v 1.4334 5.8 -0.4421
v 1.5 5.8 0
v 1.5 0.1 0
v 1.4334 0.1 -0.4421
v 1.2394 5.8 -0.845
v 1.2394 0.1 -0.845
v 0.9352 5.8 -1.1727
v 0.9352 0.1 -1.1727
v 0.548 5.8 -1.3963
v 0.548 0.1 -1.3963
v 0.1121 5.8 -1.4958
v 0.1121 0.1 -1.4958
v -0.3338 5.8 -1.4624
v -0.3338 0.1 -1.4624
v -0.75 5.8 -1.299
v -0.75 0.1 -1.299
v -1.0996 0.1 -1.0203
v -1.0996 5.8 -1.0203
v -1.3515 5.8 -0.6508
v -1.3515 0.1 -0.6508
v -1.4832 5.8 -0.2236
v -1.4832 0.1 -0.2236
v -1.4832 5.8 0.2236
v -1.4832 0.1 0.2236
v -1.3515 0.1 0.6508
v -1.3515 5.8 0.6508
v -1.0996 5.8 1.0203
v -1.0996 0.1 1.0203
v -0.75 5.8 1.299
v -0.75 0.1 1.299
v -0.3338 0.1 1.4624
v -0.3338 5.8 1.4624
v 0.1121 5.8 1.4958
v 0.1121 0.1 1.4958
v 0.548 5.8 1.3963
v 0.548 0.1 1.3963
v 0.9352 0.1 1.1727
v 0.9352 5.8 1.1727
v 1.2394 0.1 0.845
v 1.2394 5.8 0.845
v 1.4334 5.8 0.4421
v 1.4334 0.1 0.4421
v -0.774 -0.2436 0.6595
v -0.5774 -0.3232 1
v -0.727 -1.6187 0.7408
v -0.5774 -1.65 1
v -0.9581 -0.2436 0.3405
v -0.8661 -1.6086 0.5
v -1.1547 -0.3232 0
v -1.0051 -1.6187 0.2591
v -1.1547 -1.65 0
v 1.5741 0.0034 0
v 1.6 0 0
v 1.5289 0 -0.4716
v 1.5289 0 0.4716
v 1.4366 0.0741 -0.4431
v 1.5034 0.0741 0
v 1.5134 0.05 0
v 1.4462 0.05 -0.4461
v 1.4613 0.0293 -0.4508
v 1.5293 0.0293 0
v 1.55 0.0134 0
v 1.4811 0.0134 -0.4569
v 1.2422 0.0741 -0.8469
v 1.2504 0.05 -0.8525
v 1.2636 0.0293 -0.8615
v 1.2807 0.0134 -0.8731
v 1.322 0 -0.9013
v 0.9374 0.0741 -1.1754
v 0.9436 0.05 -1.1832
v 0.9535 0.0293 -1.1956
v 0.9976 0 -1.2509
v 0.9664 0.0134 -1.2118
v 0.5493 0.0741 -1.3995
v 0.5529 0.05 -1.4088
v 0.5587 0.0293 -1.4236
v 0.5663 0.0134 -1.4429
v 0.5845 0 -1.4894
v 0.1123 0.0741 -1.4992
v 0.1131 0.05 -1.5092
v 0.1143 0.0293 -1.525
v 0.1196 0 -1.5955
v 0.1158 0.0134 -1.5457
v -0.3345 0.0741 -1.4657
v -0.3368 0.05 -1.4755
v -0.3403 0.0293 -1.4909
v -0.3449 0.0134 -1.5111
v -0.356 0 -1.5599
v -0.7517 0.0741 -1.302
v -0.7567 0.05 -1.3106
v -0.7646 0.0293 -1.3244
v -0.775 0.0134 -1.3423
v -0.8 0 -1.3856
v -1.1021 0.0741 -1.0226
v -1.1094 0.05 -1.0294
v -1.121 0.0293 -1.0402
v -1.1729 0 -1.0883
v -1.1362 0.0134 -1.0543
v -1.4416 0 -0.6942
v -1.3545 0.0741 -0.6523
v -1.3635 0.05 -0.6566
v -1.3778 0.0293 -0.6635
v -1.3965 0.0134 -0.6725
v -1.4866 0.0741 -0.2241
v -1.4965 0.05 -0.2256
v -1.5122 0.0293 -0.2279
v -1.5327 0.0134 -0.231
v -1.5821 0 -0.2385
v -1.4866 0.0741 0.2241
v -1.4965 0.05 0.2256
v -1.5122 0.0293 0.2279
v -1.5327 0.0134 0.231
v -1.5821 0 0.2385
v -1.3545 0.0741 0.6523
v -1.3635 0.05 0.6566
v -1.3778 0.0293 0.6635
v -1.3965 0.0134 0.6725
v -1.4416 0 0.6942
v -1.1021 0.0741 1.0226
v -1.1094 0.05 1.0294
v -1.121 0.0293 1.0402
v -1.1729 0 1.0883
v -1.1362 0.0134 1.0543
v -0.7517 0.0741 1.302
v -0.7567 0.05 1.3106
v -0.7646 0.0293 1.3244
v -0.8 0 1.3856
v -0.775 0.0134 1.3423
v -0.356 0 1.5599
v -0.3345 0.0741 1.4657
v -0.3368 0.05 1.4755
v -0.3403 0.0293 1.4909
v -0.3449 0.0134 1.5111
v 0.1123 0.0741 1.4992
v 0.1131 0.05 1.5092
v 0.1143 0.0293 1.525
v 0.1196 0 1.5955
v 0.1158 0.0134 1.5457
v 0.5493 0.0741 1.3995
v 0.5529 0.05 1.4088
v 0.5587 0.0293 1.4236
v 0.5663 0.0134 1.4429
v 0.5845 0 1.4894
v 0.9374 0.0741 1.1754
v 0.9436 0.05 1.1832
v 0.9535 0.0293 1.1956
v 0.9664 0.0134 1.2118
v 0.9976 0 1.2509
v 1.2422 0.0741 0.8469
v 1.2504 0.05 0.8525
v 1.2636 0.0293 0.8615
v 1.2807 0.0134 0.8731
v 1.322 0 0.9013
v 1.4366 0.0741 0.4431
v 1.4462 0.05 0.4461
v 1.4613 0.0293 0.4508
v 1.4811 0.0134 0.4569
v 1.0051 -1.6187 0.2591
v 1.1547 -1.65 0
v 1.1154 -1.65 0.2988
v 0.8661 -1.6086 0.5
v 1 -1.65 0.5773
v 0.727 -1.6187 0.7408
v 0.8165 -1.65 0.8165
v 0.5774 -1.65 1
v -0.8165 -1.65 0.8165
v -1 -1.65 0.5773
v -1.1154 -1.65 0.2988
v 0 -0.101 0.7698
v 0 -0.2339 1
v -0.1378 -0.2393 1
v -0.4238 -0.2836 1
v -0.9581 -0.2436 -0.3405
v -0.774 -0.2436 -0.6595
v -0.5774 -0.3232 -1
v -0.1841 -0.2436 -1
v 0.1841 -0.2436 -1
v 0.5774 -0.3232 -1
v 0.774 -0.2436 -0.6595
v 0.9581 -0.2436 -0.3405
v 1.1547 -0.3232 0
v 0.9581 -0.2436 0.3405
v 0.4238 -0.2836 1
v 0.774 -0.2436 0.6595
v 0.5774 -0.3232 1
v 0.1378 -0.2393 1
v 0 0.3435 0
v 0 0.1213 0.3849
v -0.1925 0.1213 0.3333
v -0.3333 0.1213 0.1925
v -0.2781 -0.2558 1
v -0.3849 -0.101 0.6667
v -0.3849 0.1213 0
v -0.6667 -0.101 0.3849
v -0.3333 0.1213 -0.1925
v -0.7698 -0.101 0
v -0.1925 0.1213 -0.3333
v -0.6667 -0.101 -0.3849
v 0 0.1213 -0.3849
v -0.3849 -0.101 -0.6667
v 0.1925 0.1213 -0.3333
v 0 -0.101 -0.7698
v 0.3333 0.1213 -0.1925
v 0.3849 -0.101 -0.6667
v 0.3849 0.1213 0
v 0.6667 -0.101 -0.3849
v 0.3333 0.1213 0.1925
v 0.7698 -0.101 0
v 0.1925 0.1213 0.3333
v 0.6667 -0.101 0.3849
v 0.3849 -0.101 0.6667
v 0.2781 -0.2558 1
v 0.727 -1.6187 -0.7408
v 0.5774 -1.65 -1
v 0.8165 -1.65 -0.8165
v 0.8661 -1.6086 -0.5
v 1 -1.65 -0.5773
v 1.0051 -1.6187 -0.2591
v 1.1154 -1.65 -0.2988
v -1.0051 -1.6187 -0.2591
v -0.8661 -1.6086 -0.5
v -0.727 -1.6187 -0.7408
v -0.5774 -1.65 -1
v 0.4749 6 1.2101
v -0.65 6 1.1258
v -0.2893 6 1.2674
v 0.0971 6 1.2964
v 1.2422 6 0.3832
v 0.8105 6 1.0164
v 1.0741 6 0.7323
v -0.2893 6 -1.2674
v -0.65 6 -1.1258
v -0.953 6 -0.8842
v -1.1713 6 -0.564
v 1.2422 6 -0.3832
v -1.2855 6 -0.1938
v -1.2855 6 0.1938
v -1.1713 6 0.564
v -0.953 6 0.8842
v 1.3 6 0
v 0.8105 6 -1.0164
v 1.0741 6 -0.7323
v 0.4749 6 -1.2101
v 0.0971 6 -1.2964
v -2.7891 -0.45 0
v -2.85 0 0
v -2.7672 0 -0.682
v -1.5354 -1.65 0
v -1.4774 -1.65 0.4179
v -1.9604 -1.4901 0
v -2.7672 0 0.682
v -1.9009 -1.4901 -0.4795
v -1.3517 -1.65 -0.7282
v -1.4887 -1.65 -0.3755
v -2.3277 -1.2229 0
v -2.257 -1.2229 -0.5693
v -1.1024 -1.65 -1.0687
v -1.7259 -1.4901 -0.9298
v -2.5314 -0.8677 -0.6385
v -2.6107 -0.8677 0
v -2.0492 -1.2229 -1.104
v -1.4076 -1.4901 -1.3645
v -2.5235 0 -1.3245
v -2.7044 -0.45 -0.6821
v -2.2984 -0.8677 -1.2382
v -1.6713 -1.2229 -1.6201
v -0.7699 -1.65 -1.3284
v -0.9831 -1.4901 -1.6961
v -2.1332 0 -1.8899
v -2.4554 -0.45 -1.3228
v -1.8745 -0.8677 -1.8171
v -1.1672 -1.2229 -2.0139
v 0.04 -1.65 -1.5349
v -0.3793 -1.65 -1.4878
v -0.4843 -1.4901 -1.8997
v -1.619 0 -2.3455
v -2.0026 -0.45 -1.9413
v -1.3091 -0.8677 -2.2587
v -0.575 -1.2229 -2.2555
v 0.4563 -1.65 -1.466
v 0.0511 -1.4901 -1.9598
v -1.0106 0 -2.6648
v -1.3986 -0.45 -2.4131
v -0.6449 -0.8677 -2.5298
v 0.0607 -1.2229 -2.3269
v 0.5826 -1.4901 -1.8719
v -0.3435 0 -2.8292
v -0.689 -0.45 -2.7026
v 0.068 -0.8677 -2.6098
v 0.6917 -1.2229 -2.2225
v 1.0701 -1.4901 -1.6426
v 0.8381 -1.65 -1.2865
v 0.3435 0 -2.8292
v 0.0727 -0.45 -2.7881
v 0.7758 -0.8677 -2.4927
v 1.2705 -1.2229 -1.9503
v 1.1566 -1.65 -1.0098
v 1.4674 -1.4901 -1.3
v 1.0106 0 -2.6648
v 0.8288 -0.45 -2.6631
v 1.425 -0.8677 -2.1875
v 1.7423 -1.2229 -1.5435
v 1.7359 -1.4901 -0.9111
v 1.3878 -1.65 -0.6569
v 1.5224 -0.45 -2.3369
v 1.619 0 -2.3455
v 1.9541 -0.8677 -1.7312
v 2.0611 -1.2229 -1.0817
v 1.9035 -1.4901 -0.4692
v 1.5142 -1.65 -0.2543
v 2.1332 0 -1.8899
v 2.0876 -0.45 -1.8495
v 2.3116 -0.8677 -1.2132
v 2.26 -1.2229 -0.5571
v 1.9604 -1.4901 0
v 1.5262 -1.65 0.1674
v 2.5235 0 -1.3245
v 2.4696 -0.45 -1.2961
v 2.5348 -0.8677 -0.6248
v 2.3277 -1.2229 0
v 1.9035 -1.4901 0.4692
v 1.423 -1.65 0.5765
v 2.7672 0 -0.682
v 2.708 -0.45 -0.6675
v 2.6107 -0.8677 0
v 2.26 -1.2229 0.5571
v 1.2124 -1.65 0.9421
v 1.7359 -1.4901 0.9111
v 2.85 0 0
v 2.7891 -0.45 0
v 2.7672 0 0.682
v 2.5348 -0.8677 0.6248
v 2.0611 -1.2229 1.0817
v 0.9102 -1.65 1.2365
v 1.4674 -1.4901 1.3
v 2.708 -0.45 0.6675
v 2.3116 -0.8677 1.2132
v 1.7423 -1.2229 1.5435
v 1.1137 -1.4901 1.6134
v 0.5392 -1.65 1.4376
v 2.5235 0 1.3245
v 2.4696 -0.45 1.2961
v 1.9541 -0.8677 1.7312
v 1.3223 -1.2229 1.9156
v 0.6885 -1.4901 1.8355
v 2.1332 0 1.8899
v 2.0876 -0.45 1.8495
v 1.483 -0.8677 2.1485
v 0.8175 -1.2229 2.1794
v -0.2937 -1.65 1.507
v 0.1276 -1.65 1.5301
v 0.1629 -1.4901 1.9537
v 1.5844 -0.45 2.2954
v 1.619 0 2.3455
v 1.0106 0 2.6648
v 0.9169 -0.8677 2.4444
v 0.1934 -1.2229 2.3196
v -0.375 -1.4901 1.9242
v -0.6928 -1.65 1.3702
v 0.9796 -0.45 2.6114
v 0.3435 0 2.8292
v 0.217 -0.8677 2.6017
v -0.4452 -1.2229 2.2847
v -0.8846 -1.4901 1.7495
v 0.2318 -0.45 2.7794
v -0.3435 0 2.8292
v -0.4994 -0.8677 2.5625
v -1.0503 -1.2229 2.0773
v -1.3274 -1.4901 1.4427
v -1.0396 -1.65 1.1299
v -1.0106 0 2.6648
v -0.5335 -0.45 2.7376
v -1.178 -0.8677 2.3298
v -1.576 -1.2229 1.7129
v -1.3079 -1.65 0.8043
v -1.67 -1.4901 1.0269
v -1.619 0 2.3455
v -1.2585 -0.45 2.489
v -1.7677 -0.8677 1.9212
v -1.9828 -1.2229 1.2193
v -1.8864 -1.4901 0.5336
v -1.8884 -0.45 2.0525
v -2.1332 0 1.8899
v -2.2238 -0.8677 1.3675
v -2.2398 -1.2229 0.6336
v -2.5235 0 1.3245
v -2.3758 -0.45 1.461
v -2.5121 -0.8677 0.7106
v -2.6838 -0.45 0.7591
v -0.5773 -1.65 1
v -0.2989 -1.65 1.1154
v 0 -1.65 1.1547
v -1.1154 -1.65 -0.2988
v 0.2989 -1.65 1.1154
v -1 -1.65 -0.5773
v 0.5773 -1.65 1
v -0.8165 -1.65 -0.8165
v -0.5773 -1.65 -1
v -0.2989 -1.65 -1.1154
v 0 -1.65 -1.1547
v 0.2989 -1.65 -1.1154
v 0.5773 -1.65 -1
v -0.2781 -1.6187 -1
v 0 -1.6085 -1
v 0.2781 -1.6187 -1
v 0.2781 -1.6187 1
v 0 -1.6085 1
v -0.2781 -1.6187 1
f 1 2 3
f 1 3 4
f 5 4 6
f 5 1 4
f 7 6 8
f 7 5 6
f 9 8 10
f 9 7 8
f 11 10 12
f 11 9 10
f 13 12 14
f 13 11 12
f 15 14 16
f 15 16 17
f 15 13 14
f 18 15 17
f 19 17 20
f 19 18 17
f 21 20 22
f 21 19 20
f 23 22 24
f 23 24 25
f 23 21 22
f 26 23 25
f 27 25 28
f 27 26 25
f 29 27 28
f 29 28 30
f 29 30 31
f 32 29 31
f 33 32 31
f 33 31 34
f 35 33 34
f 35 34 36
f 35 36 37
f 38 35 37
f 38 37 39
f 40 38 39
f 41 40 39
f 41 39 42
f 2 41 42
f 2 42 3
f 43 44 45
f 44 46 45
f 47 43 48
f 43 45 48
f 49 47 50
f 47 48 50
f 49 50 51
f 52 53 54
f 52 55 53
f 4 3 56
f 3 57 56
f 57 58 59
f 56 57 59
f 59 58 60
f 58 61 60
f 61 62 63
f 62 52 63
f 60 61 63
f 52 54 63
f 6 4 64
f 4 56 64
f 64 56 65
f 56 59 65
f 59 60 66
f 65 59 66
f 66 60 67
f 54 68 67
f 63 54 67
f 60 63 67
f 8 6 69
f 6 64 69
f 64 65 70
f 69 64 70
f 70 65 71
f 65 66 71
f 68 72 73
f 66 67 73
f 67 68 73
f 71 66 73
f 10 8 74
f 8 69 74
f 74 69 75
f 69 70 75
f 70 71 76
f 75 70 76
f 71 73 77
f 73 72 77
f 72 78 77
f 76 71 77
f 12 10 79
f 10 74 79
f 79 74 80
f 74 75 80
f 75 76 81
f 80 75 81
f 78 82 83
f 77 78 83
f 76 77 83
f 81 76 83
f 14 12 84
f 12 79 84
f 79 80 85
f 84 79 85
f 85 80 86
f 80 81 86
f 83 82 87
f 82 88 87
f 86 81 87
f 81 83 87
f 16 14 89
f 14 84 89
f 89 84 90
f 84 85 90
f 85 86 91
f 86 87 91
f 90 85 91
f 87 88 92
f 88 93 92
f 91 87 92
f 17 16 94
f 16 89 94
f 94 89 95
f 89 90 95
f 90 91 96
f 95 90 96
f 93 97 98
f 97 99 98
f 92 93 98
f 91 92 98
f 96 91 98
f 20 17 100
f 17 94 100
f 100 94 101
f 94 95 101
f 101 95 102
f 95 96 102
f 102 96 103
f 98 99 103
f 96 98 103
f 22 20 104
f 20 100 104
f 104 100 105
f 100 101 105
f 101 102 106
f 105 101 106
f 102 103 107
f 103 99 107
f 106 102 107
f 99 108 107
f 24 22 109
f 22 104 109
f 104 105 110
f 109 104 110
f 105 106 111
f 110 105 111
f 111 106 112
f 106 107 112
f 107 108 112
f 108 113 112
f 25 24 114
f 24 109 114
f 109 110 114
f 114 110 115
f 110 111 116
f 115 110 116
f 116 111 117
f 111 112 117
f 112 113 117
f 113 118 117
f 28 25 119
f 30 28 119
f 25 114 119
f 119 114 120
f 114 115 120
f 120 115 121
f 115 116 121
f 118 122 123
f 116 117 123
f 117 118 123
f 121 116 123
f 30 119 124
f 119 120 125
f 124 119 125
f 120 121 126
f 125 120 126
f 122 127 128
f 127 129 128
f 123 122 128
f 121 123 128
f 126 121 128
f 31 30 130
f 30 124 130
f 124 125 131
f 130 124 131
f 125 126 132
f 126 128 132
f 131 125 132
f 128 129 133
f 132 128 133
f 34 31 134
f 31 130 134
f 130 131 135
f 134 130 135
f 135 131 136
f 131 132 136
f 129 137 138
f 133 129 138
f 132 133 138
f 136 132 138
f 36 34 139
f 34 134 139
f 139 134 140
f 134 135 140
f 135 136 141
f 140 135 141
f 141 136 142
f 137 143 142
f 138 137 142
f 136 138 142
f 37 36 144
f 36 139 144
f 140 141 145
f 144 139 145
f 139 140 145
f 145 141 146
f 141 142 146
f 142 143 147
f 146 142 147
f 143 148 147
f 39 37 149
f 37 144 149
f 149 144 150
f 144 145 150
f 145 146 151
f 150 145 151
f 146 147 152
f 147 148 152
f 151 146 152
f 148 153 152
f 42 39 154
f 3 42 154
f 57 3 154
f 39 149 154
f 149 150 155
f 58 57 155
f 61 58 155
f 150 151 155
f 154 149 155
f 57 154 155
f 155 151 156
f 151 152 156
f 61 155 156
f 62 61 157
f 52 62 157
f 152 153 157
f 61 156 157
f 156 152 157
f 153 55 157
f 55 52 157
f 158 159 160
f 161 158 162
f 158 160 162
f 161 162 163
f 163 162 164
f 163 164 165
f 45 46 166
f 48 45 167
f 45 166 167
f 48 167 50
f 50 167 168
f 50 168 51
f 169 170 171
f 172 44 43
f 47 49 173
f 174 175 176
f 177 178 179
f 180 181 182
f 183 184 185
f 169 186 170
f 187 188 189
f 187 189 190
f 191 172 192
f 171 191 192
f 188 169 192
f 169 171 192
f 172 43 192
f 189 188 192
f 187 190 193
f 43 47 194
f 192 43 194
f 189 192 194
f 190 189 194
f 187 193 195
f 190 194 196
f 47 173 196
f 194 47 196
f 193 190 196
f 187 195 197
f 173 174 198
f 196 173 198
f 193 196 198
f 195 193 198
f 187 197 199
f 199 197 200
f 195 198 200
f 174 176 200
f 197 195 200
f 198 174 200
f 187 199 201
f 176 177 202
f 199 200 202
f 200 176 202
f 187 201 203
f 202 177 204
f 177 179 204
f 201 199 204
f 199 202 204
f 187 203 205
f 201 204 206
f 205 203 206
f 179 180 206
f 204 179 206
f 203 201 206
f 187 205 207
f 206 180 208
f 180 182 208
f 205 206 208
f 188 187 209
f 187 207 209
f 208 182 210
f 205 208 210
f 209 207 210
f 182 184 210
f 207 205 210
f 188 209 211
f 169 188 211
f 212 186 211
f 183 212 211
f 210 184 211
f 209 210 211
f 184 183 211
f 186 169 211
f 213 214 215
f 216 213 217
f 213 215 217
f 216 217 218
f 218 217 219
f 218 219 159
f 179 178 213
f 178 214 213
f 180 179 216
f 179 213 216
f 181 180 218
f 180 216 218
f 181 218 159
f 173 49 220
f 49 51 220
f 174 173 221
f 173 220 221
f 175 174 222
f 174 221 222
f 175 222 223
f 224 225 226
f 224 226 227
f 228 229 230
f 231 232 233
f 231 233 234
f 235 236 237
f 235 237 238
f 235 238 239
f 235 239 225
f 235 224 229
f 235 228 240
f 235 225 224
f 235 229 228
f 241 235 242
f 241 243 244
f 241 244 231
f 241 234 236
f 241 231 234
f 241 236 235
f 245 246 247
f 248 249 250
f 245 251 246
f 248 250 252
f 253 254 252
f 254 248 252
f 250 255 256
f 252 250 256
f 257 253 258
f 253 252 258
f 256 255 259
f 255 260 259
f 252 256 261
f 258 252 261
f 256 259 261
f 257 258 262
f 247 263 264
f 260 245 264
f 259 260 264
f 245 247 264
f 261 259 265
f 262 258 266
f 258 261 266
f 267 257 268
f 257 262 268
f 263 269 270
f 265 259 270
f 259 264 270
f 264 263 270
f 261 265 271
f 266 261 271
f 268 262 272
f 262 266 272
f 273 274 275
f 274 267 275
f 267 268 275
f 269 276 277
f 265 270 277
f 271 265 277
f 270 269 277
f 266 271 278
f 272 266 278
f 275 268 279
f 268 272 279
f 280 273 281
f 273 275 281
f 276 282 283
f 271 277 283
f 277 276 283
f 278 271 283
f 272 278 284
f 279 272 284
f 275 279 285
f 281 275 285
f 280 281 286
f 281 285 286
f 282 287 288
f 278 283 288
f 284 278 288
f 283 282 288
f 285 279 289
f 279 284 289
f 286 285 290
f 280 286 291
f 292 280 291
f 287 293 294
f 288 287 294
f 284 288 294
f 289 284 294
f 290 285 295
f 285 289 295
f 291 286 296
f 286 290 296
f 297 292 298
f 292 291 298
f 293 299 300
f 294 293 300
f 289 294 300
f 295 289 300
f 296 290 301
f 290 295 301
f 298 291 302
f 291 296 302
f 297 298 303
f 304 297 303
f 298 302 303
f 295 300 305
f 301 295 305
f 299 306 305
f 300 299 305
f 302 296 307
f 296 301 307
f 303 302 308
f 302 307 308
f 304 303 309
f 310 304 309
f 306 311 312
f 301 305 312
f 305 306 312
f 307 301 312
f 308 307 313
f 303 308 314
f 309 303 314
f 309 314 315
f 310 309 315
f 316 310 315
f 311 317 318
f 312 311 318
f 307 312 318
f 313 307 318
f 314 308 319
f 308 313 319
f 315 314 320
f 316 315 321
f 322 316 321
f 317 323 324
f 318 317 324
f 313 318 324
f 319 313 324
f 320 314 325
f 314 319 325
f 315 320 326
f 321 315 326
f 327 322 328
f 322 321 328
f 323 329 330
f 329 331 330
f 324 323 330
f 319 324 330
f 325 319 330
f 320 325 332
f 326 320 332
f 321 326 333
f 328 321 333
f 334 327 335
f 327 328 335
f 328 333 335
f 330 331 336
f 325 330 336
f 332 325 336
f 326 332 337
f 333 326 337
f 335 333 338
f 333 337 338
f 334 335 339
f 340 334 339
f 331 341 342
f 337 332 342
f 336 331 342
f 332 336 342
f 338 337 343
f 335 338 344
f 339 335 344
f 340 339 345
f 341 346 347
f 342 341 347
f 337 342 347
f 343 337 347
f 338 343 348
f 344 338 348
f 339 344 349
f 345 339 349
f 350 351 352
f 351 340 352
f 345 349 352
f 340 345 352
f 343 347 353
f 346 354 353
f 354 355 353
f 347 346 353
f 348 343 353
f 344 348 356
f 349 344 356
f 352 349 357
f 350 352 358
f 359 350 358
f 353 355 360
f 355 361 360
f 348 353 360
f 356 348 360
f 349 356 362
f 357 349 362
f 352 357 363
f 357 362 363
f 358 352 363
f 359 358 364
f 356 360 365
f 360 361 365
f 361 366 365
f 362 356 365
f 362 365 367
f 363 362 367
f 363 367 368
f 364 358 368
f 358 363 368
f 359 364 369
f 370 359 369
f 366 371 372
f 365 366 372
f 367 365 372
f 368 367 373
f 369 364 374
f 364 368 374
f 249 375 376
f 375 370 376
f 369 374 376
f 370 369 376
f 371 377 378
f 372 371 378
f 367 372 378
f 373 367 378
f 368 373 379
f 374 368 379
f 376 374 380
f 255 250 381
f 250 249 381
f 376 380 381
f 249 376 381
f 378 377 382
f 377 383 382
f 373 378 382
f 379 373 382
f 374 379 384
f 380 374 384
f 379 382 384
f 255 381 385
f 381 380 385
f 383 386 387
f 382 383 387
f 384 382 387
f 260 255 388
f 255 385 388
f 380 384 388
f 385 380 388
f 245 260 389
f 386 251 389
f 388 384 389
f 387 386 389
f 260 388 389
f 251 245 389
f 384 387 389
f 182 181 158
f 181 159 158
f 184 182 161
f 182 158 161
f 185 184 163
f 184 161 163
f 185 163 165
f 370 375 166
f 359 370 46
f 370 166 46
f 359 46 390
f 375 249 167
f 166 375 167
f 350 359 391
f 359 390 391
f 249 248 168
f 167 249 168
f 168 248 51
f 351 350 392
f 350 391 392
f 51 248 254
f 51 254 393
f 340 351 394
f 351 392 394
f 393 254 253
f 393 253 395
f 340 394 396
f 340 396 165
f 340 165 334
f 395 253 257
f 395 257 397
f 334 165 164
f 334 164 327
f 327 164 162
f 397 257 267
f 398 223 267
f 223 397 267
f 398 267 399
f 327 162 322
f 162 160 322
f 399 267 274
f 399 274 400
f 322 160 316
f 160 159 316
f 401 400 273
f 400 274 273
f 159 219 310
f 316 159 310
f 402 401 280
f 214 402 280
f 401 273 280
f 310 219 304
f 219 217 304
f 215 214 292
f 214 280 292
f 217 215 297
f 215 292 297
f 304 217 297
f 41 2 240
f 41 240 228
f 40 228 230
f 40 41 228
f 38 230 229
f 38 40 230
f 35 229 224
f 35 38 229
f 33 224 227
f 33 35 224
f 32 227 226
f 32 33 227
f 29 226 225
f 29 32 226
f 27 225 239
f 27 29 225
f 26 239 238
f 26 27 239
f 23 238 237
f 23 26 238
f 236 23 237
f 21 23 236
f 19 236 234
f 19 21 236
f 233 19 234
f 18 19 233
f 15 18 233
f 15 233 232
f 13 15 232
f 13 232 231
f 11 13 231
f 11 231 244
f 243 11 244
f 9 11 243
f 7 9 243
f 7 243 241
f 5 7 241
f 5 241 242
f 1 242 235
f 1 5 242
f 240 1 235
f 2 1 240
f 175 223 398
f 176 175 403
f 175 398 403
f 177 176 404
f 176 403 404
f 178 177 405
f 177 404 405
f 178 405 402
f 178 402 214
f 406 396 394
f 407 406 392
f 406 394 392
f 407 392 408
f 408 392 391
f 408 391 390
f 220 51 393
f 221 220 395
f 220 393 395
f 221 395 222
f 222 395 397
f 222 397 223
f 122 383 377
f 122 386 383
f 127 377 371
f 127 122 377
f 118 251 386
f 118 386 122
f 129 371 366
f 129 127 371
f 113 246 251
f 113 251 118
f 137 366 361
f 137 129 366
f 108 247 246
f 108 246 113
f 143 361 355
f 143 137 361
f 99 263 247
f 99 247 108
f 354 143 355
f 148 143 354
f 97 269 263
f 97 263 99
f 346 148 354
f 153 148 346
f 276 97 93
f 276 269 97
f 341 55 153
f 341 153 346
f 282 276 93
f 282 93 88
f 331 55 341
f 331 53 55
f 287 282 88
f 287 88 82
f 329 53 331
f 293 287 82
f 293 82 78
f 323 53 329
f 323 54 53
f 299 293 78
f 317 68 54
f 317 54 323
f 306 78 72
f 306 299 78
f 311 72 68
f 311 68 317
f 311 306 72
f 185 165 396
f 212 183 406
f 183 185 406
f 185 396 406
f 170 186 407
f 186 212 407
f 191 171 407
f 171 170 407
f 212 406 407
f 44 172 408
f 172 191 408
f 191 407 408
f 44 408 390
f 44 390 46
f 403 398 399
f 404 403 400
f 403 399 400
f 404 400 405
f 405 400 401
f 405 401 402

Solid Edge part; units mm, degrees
sketch "Sketch1" plane through (0, 0, 0) normal (0, 0, 1) x (1, 0, 0)
  line L0 (1.5, 0) -> (1.5, 6)
  line L1 (0, 6) -> (1.5, 6)
  line L2 (0, 0) -> (0, 6)
  line L3 (0, 0) -> (0, -1.65)
  line L4 (0, -1.65) -> (2.85, -1.65)
  line L5 (2.85, -1.65) -> (2.85, 0)
  line L6 (2.85, 0) -> (1.5, 0)
revolve "RevolvedProtrusion1" add sketch "Sketch1" angle 360 about axis through (0, 0, 0) along (0, 1, 0)
sketch "Sketch2" plane through (0, 0, 0) normal (1, 0, 0) x (0, 1, 0)
  line L0 (-1.65, 1.6515) -> (-0.61, 1.6515)
  line L1 (0.3435, 0) -> (-0.61, 1.6515)
  line L2 (-1.65, 0) -> (0.3435, 0)
  line L3 (-1.65, 0) -> (-1.65, 1.6515)
revolve "RevolvedCutout1" cut sketch "Sketch2" angle 360 about axis through (0, -4.5, 0) along (0, 1, 0)
sketch "Sketch3" plane through (0, -1.65, 0) normal (0, -1, 0) x (0, 0, 1)
  circle A0 centre (0, 0) radius 1.6515
  line L0 (-1, -0.5774) -> (0, -1.1547)
  line L1 (0, -1.1547) -> (1, -0.5774)
  line L2 (1, -0.5774) -> (1, 0.5774)
  line L3 (1, 0.5774) -> (0, 1.1547)
  line L4 (0, 1.1547) -> (-1, 0.5774)
  line L5 (-1, 0.5774) -> (-1, -0.5774)
  dimension "D1" = 2
extrude "Protrusion1" add sketch "Sketch3" against normal up to next
sketch "Sketch4" plane through (0, 0, 0) normal (0, 0, 1) x (1, 0, 0)
  line L0 (-1.1547, -1.65) -> (0, -1.65)
  line L1 (0, -1.65) -> (0, -1.3406)
  line L2 (0, -1.3406) -> (-1.1547, -1.65)
revolve "RevolvedCutout2" cut sketch "Sketch4" angle 360 about axis through (0, -4.5, 0) along (0, 1, 0)
fillet "Round1" radius 0.1 1 edges at (0, 0, -1.5)
chamfer "倒斜角_2" distance 0.2 angle 45 1 edges at (0, 6, -1.5)
cosmetic_thread "螺纹_3" size "M3" thread depth 5
sketch "Sketch5" plane through (0, 0, 0) normal (0, 0, 1) x (1, 0, 0)
  arc A0 (-1.5353, -1.65) -> (-2.85, 0) centre (-1.1572, 0) cw
revolve "RevolvedCutout3" cut sketch "Sketch5" angle 360 about axis through (0, 0, 0) along (0, -1, 0) material side at (-2.5202, -1.086, 0)
